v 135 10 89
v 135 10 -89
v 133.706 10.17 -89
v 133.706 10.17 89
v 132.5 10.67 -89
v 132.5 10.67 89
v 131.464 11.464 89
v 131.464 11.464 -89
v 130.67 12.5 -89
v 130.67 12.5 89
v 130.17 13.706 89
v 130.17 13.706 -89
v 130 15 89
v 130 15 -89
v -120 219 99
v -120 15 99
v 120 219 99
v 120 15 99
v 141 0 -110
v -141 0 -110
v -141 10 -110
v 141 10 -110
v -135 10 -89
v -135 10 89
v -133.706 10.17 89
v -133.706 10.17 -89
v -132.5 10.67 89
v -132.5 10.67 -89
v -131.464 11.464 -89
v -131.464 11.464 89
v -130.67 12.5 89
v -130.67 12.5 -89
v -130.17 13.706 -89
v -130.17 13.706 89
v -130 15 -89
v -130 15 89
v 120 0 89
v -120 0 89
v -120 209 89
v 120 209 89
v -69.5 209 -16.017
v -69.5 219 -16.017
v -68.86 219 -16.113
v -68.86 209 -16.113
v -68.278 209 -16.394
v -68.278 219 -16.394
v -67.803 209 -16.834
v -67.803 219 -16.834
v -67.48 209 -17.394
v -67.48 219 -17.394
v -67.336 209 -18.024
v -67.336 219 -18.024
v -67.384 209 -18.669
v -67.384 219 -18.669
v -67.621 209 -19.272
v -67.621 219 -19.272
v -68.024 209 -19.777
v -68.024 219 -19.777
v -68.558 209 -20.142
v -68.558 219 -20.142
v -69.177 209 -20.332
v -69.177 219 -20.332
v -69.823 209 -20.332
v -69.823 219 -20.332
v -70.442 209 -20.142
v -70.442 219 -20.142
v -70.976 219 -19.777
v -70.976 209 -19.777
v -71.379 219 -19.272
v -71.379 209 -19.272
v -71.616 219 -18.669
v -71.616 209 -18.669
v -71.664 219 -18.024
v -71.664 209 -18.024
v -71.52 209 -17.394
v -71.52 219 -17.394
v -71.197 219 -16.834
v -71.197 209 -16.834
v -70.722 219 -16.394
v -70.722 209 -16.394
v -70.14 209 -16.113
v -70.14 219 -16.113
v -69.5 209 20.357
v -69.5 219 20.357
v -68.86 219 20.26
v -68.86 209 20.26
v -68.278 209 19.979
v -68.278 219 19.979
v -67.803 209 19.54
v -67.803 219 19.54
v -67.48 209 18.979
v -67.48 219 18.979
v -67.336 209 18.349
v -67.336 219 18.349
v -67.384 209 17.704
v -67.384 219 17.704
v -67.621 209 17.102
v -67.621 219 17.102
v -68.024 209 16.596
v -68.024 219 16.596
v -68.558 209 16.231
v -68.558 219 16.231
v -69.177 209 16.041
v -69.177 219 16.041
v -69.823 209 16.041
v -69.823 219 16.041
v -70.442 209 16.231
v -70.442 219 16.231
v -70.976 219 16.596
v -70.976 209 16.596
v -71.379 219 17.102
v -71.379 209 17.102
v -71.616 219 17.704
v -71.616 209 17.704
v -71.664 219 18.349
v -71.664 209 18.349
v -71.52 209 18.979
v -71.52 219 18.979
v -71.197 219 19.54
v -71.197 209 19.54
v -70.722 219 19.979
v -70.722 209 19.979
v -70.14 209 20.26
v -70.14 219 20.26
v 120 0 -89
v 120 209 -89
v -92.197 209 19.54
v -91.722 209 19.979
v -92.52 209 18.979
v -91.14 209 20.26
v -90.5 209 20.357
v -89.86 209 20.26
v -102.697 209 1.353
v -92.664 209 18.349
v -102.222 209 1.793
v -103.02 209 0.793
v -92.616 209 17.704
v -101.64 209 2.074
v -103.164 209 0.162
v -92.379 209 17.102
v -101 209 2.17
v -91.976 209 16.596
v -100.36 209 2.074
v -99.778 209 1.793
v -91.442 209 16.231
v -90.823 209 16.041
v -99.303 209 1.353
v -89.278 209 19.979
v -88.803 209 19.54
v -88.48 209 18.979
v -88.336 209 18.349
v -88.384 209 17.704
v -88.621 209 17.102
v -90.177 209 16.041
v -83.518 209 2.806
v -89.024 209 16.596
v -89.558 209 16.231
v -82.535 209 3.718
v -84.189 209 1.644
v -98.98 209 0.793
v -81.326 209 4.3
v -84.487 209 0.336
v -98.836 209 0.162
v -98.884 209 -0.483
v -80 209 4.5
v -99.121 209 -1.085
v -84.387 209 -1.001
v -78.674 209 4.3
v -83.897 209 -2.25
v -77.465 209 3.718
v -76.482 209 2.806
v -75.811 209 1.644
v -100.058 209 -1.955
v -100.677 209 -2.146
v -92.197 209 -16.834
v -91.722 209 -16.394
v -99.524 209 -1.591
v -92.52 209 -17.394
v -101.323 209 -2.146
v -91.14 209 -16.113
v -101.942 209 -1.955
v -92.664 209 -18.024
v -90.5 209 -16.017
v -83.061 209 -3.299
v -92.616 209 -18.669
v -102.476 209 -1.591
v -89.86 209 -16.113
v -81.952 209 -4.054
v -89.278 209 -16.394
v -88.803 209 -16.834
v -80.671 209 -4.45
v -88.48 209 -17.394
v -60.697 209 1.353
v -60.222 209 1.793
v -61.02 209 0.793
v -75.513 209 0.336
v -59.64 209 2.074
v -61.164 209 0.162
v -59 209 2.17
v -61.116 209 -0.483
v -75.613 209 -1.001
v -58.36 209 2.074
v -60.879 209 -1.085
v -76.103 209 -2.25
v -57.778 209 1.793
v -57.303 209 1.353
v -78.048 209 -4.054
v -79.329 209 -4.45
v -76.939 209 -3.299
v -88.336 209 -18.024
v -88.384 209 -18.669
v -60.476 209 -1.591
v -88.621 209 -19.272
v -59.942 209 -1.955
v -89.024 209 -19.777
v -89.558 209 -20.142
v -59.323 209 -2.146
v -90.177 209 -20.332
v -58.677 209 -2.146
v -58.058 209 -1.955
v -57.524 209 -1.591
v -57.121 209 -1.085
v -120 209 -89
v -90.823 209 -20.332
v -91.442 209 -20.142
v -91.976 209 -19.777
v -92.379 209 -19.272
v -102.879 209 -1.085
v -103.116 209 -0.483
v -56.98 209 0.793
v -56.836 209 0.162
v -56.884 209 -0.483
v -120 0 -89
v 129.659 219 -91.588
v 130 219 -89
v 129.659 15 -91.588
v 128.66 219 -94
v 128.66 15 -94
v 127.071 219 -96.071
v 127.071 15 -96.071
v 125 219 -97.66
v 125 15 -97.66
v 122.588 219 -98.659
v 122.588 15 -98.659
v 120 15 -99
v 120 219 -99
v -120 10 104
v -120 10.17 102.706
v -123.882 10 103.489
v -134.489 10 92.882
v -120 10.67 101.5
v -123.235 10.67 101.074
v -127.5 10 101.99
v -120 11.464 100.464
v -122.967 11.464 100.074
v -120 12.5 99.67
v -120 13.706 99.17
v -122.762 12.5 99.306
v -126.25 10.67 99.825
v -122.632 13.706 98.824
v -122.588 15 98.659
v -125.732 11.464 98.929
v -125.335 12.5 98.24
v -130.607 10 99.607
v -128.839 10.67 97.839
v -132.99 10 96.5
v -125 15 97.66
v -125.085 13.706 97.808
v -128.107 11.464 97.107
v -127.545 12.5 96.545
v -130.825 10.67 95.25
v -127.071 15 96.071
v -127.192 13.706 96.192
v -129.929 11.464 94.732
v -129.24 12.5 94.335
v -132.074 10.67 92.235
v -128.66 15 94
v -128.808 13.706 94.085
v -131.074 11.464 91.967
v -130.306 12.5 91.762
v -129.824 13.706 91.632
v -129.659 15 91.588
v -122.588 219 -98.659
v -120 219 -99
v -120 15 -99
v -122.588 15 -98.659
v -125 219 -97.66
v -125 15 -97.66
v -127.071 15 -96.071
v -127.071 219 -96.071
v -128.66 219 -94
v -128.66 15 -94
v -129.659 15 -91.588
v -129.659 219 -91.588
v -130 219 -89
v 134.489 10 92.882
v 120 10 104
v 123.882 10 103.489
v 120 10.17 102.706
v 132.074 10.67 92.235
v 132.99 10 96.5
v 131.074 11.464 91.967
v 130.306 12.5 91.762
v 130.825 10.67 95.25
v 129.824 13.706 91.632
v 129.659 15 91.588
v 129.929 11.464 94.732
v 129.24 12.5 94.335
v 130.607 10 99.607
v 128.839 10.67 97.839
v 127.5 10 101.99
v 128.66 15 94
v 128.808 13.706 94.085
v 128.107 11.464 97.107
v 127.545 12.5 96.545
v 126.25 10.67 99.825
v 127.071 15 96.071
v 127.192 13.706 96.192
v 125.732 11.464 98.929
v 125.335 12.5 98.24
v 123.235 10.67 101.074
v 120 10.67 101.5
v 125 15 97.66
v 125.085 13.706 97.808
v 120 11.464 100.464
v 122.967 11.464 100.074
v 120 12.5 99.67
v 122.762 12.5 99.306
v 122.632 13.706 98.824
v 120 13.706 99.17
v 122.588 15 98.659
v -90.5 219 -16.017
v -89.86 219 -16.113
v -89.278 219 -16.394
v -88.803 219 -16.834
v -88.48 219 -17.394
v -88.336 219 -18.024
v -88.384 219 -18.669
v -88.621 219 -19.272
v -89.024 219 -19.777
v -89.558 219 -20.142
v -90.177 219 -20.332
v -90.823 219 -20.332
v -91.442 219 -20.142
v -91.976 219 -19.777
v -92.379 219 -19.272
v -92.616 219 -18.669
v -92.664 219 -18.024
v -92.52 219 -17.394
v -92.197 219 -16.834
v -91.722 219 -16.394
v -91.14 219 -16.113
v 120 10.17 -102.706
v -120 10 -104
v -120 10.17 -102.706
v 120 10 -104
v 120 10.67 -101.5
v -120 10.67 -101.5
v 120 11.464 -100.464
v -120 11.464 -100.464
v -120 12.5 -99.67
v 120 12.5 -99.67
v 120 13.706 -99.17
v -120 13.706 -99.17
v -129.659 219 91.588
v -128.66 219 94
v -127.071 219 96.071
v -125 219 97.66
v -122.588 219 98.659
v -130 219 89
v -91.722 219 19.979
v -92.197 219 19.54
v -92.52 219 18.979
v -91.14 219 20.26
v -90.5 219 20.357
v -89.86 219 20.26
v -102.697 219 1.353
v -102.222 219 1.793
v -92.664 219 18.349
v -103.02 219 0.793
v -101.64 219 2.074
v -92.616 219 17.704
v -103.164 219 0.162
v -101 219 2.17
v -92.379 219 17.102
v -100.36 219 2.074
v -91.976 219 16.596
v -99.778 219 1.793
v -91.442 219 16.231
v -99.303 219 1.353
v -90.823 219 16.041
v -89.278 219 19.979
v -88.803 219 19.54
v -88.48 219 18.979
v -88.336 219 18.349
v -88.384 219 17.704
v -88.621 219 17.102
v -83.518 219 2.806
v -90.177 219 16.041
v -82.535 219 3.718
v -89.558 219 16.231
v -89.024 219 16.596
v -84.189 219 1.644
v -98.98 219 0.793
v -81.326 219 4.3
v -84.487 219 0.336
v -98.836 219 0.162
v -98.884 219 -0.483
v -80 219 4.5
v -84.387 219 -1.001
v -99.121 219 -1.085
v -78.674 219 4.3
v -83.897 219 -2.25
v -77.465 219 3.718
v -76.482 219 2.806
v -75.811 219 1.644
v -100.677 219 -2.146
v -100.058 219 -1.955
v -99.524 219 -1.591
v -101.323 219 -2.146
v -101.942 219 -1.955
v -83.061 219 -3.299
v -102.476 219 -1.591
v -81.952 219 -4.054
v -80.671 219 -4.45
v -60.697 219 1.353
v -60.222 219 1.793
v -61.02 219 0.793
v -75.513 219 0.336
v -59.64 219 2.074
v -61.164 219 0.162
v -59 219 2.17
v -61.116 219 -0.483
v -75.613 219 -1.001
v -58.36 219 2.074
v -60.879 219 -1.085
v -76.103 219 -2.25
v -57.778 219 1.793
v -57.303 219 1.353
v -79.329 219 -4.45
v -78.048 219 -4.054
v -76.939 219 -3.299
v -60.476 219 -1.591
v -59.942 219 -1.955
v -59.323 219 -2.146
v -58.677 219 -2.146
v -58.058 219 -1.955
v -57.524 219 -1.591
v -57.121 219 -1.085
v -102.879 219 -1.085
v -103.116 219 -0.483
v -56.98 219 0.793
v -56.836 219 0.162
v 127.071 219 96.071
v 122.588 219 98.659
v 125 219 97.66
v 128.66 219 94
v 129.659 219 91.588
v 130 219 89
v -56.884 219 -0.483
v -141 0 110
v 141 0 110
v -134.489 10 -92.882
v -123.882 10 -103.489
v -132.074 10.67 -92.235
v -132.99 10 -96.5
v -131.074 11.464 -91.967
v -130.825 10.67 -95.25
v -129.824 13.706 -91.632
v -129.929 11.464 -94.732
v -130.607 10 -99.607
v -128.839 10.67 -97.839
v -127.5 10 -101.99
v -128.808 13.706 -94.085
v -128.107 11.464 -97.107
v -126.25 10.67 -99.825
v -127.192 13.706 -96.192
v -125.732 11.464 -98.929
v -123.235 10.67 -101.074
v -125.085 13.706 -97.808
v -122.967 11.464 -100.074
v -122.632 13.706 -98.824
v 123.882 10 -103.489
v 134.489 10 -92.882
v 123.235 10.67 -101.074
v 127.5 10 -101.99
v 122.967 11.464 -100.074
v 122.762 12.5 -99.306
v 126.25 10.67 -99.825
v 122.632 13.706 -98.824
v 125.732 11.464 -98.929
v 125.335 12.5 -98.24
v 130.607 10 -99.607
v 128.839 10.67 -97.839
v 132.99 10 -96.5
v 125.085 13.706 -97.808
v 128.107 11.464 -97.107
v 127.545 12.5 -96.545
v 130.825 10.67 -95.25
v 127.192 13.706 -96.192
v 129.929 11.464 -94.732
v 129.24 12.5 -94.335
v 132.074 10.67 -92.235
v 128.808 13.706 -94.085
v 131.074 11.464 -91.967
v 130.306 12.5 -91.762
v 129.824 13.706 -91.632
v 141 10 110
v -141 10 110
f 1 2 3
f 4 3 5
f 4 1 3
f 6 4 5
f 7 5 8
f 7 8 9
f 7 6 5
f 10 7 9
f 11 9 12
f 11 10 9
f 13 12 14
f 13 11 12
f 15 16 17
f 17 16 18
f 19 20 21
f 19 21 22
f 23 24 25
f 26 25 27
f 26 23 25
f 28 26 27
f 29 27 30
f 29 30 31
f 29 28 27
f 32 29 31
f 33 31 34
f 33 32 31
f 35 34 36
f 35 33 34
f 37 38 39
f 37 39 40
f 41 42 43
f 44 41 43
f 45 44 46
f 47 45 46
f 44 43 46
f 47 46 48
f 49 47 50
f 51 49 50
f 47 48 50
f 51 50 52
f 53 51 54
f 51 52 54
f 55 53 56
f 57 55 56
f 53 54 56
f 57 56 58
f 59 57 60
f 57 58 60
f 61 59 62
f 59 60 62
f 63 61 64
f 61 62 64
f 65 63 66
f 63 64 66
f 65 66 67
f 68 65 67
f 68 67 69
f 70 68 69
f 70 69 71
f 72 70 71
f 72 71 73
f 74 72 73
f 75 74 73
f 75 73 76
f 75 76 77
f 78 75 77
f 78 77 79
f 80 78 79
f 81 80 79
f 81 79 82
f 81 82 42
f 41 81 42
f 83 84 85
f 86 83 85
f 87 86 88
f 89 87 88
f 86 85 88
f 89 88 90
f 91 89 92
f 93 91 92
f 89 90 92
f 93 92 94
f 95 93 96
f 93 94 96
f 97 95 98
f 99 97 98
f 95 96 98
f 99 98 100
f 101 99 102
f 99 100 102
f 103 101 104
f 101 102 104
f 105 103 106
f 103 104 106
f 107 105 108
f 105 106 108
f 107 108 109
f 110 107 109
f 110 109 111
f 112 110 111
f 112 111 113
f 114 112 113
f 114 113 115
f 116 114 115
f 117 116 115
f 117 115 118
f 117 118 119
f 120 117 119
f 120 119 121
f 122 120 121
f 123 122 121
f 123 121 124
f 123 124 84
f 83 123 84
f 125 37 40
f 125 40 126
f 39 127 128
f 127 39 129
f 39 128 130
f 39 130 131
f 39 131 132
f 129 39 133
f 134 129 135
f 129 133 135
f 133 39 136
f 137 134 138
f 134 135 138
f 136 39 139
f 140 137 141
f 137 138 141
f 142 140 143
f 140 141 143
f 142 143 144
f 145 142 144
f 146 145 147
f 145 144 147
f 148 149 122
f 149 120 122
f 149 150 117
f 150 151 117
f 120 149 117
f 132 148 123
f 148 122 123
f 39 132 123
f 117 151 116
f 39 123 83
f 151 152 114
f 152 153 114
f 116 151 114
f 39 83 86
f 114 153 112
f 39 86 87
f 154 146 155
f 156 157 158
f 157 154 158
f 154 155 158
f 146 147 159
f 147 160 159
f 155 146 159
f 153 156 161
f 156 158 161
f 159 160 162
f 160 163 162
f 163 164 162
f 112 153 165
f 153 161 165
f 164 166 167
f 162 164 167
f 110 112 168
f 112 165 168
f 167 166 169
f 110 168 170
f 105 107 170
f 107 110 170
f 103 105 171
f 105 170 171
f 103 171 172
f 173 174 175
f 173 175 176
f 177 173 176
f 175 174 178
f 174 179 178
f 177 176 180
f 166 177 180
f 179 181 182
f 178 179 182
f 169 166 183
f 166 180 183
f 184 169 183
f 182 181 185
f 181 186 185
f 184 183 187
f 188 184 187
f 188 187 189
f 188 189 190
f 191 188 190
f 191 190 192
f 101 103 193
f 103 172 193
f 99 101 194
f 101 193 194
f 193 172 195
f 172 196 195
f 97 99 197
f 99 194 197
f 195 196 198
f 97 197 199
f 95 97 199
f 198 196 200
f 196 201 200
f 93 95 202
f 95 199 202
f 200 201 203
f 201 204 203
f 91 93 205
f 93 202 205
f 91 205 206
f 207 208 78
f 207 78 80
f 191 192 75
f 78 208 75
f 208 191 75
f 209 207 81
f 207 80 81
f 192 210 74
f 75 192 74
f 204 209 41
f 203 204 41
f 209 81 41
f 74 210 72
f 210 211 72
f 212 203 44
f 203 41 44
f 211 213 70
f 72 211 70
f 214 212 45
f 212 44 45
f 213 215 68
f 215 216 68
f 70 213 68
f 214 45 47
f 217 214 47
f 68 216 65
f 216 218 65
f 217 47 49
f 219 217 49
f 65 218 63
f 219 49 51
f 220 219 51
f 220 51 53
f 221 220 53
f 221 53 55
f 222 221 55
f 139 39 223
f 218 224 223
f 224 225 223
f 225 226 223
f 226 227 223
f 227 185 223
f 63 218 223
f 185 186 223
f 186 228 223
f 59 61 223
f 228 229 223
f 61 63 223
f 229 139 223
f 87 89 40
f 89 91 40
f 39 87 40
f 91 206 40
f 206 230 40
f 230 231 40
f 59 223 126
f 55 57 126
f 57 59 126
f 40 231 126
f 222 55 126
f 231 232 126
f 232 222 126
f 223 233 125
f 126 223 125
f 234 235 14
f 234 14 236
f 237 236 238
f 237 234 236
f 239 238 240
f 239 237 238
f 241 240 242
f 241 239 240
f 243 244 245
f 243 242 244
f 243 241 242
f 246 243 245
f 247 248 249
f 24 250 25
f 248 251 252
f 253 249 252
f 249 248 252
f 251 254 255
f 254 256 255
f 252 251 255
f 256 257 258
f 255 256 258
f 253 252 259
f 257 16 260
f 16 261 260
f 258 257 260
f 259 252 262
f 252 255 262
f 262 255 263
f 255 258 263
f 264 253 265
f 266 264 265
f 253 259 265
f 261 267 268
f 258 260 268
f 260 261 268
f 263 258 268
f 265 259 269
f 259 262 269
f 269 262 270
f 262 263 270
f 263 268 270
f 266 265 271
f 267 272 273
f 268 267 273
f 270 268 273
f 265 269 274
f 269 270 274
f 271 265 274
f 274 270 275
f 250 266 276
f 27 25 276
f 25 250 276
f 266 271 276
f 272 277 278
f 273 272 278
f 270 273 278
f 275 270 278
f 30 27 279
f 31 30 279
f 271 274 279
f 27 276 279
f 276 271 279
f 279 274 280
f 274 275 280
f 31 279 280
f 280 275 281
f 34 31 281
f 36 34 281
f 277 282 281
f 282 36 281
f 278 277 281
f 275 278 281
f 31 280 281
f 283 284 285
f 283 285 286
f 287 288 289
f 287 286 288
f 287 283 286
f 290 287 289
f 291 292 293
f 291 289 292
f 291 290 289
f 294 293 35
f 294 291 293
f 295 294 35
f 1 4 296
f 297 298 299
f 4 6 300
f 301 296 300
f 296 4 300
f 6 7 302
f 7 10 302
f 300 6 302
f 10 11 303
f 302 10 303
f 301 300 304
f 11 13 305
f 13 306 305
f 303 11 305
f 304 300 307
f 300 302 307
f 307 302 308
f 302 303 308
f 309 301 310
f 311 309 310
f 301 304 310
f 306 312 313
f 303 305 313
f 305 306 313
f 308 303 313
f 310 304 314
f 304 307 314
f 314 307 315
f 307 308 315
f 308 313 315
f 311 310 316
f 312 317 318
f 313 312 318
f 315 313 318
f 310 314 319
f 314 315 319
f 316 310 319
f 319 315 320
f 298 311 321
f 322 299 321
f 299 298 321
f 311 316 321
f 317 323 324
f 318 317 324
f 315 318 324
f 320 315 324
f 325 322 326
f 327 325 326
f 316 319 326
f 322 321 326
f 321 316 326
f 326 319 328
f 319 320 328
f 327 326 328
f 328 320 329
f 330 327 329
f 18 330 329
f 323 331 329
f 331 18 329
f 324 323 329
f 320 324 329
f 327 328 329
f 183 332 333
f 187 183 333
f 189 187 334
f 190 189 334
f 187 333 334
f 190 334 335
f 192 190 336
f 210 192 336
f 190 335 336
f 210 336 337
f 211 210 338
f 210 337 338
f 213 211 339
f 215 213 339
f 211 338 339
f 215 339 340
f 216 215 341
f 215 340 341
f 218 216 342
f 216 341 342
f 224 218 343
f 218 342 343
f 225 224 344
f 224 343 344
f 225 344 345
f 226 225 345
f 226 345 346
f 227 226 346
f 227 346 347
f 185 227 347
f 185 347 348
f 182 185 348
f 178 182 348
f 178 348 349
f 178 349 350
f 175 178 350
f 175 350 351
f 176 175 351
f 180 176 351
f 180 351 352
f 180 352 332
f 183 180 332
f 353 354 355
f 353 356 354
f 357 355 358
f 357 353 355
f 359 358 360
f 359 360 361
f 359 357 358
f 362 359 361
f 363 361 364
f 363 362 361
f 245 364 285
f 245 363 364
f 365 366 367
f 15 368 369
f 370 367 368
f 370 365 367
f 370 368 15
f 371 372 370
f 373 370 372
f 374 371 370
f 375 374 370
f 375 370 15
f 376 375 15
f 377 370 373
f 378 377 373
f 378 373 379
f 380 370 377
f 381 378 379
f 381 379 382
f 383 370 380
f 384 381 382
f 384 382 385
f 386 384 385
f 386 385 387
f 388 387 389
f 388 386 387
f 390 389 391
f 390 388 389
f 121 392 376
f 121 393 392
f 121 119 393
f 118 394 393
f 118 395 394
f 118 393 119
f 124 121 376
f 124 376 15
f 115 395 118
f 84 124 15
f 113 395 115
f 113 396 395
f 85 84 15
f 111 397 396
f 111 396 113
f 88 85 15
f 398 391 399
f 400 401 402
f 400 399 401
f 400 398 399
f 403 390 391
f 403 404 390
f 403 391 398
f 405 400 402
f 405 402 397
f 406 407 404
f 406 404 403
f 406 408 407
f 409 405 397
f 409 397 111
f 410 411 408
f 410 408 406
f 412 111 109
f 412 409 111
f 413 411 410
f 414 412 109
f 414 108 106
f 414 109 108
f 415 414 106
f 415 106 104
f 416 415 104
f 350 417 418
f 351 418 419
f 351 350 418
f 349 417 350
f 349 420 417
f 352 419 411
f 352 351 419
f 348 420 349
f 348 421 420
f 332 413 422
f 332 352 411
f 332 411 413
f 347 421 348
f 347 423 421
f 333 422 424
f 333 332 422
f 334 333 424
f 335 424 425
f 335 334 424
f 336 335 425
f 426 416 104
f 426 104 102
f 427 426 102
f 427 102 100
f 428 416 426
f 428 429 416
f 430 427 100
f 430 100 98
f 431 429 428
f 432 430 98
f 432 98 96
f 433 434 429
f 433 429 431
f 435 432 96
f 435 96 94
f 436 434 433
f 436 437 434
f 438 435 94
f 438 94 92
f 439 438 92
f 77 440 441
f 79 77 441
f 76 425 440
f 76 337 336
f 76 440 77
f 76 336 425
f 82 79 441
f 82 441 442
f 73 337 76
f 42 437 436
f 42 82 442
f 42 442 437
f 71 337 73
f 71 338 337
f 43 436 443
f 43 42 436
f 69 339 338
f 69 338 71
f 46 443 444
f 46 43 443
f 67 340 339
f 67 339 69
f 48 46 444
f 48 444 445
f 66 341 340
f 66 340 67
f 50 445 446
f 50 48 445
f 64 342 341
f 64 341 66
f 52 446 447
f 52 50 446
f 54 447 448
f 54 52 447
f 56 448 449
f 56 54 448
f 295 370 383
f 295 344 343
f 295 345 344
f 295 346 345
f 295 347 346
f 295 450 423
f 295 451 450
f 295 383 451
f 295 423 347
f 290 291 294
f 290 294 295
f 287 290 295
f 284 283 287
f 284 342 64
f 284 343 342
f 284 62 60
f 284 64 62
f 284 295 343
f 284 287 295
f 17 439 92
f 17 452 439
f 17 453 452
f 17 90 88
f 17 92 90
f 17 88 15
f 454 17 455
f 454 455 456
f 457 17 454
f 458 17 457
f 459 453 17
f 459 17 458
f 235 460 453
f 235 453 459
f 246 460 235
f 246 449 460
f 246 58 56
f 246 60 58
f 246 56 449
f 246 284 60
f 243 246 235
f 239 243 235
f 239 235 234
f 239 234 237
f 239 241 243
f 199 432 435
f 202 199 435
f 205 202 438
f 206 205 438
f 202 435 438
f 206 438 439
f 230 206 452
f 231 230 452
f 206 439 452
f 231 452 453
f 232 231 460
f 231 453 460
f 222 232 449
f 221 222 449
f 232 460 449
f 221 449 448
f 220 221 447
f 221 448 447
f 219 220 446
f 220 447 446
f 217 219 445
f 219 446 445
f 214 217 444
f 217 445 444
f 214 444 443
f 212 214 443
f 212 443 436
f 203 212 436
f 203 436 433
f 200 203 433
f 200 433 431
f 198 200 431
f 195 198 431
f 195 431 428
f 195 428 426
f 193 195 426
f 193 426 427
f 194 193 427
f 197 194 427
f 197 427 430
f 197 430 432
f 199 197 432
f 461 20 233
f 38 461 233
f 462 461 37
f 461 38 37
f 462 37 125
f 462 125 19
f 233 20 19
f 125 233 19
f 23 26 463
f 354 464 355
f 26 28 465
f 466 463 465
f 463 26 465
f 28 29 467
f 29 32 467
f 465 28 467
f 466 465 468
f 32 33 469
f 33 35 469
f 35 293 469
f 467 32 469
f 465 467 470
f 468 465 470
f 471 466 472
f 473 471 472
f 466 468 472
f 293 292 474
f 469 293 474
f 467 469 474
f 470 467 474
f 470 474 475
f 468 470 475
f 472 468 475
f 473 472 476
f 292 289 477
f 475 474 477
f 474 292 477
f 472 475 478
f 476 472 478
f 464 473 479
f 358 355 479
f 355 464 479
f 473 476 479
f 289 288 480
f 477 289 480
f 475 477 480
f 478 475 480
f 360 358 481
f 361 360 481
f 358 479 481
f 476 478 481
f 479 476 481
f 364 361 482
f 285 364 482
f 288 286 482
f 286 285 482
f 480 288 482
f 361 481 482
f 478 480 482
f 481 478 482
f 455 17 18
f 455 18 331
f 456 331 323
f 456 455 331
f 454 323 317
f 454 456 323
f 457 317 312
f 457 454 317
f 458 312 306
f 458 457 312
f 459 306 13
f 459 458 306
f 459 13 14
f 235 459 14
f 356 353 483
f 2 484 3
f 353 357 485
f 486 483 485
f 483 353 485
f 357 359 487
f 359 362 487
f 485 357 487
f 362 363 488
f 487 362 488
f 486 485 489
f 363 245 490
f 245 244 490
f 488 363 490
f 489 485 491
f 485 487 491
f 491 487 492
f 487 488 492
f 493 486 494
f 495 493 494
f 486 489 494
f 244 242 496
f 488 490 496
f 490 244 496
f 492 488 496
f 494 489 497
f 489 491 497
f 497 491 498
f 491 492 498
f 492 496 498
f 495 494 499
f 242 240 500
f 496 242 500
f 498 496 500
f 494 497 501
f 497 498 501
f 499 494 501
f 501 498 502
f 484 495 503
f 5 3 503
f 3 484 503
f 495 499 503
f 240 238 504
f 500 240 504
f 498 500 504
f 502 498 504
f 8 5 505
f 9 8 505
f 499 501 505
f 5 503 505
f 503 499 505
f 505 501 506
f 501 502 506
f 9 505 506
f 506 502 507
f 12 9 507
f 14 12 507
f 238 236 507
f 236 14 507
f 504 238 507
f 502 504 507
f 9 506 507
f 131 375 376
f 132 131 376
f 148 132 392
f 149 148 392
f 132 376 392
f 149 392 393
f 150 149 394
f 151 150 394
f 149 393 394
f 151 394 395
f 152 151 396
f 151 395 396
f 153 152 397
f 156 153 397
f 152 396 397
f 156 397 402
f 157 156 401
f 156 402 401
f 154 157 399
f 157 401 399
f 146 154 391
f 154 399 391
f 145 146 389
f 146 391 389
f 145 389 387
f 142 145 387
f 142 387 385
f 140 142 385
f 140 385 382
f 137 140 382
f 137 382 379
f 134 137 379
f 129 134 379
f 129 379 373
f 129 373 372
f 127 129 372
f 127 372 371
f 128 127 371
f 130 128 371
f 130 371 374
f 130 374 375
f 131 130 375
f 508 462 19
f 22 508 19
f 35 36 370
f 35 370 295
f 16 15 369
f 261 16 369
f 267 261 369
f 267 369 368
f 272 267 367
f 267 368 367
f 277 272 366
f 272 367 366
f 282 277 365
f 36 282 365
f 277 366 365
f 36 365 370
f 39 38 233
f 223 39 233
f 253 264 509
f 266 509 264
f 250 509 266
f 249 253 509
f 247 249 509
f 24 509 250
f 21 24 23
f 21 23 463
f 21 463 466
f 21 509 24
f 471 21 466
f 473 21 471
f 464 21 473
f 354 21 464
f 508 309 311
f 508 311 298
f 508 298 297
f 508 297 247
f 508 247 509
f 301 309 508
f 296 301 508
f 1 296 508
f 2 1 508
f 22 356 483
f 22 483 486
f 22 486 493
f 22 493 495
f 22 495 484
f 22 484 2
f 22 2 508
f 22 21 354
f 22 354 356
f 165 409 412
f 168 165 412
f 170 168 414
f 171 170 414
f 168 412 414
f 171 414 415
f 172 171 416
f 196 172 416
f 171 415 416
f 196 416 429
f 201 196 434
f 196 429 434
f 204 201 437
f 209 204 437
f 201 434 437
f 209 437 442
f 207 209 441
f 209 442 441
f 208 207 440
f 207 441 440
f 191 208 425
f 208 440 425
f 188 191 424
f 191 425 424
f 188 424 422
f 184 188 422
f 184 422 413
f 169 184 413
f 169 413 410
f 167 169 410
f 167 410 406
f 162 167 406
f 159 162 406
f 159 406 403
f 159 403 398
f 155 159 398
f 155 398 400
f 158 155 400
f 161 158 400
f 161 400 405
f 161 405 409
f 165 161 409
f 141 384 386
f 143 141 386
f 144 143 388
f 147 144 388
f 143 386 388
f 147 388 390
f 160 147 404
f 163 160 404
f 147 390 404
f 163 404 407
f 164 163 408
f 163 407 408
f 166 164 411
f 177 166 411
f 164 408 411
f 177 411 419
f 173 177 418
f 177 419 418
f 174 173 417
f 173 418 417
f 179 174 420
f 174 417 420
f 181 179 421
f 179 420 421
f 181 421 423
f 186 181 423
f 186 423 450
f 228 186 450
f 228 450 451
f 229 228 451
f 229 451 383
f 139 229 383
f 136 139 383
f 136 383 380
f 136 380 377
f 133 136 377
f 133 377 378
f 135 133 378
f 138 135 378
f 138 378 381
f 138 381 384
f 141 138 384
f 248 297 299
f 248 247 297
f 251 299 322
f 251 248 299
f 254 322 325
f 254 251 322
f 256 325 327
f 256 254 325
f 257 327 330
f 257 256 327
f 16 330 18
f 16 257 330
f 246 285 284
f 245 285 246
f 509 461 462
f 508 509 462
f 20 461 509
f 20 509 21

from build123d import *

# Parameters (mm, degrees)
SKETCH1_W           = 260
SKETCH1_H           = 198
BOSS_EXTRUDE1_DEPTH = 219
SKETCH2_W           = 240
SKETCH2_H           = 178
CUT_EXTRUDE1_DEPTH  = 209
SKETCH3_W           = 282
SKETCH3_H           = 220
SKETCH3_W_2         = 260
SKETCH3_H_2         = 198
BOSS_EXTRUDE2_DEPTH = 10
FILLET1_R           = 10
FILLET3_R           = 5
SKETCH4_R           = 2.17
SKETCH4_R_2         = 4.5
CUT_EXTRUDE3_DEPTH  = 20


with BuildPart() as part:
    # Sketch1 → Boss-Extrude1 (new body)
    with BuildSketch(Plane(origin=(0, 0, 0), x_dir=(1, 0, 0), z_dir=(0, 1, 0))):
        Rectangle(SKETCH1_W, SKETCH1_H)
    extrude(amount=BOSS_EXTRUDE1_DEPTH)

    # Sketch2 → Cut-Extrude1 (cut)
    with BuildSketch(Plane(origin=(0, 0, 0), x_dir=(1, 0, 0), z_dir=(0, 1, 0))):
        Rectangle(SKETCH2_W, SKETCH2_H)
    extrude(amount=CUT_EXTRUDE1_DEPTH, mode=Mode.SUBTRACT)

    # Sketch3 → Boss-Extrude2 (add)
    with BuildSketch(Plane(origin=(0, 0, 0), x_dir=(1, 0, 0), z_dir=(0, 1, 0))):
        Rectangle(SKETCH3_W, SKETCH3_H)
        Rectangle(SKETCH3_W_2, SKETCH3_H_2, mode=Mode.SUBTRACT)
    extrude(amount=BOSS_EXTRUDE2_DEPTH)

    # Fillet1
    fillet1_edges = [part.edges().sort_by_distance(p)[0] for p in [
        (-130, 114.5, -99),
        (130, 114.5, -99),
        (130, 114.5, 99),
        (-130, 114.5, 99),
    ]]
    fillet(fillet1_edges, radius=FILLET1_R)

    # Fillet3
    fillet3_edges = [part.edges().sort_by_distance(p)[0] for p in [
        (0, 10, -99),
        (130, 10, 0),
        (0, 10, 99),
        (-130, 10, 0),
        (127.071067812, 10, -96.071067812),
        (127.071067812, 10, 96.071067812),
        (-127.071067812, 10, -96.071067812),
        (-127.071067812, 10, 96.071067812),
    ]]
    fillet(fillet3_edges, radius=FILLET3_R)

    # Sketch4 → Cut-Extrude3 (cut)
    with BuildSketch(Plane(origin=(0, 219, 0), x_dir=(1, 0, 0), z_dir=(0, 1, 0))):
        with Locations(Location((-59, 0, 0), (0, 0, 270))):
            Circle(SKETCH4_R)
        with Locations(Location((-69.5, -18.186533479, 0), (0, 0, 270))):
            Circle(SKETCH4_R)
        with Locations(Location((-90.5, -18.186533479, 0), (0, 0, 270))):
            Circle(SKETCH4_R)
        with Locations(Location((-101, 0, 0), (0, 0, 270))):
            Circle(SKETCH4_R)
        with Locations(Location((-90.5, 18.186533479, 0), (0, 0, 270))):
            Circle(SKETCH4_R)
        with Locations(Location((-69.5, 18.186533479, 0), (0, 0, 270))):
            Circle(SKETCH4_R)
        with Locations(Location((-80, 0, 0), (0, 0, 270))):
            Circle(SKETCH4_R_2)
    extrude(amount=-CUT_EXTRUDE3_DEPTH, mode=Mode.SUBTRACT)


solid = part.part
